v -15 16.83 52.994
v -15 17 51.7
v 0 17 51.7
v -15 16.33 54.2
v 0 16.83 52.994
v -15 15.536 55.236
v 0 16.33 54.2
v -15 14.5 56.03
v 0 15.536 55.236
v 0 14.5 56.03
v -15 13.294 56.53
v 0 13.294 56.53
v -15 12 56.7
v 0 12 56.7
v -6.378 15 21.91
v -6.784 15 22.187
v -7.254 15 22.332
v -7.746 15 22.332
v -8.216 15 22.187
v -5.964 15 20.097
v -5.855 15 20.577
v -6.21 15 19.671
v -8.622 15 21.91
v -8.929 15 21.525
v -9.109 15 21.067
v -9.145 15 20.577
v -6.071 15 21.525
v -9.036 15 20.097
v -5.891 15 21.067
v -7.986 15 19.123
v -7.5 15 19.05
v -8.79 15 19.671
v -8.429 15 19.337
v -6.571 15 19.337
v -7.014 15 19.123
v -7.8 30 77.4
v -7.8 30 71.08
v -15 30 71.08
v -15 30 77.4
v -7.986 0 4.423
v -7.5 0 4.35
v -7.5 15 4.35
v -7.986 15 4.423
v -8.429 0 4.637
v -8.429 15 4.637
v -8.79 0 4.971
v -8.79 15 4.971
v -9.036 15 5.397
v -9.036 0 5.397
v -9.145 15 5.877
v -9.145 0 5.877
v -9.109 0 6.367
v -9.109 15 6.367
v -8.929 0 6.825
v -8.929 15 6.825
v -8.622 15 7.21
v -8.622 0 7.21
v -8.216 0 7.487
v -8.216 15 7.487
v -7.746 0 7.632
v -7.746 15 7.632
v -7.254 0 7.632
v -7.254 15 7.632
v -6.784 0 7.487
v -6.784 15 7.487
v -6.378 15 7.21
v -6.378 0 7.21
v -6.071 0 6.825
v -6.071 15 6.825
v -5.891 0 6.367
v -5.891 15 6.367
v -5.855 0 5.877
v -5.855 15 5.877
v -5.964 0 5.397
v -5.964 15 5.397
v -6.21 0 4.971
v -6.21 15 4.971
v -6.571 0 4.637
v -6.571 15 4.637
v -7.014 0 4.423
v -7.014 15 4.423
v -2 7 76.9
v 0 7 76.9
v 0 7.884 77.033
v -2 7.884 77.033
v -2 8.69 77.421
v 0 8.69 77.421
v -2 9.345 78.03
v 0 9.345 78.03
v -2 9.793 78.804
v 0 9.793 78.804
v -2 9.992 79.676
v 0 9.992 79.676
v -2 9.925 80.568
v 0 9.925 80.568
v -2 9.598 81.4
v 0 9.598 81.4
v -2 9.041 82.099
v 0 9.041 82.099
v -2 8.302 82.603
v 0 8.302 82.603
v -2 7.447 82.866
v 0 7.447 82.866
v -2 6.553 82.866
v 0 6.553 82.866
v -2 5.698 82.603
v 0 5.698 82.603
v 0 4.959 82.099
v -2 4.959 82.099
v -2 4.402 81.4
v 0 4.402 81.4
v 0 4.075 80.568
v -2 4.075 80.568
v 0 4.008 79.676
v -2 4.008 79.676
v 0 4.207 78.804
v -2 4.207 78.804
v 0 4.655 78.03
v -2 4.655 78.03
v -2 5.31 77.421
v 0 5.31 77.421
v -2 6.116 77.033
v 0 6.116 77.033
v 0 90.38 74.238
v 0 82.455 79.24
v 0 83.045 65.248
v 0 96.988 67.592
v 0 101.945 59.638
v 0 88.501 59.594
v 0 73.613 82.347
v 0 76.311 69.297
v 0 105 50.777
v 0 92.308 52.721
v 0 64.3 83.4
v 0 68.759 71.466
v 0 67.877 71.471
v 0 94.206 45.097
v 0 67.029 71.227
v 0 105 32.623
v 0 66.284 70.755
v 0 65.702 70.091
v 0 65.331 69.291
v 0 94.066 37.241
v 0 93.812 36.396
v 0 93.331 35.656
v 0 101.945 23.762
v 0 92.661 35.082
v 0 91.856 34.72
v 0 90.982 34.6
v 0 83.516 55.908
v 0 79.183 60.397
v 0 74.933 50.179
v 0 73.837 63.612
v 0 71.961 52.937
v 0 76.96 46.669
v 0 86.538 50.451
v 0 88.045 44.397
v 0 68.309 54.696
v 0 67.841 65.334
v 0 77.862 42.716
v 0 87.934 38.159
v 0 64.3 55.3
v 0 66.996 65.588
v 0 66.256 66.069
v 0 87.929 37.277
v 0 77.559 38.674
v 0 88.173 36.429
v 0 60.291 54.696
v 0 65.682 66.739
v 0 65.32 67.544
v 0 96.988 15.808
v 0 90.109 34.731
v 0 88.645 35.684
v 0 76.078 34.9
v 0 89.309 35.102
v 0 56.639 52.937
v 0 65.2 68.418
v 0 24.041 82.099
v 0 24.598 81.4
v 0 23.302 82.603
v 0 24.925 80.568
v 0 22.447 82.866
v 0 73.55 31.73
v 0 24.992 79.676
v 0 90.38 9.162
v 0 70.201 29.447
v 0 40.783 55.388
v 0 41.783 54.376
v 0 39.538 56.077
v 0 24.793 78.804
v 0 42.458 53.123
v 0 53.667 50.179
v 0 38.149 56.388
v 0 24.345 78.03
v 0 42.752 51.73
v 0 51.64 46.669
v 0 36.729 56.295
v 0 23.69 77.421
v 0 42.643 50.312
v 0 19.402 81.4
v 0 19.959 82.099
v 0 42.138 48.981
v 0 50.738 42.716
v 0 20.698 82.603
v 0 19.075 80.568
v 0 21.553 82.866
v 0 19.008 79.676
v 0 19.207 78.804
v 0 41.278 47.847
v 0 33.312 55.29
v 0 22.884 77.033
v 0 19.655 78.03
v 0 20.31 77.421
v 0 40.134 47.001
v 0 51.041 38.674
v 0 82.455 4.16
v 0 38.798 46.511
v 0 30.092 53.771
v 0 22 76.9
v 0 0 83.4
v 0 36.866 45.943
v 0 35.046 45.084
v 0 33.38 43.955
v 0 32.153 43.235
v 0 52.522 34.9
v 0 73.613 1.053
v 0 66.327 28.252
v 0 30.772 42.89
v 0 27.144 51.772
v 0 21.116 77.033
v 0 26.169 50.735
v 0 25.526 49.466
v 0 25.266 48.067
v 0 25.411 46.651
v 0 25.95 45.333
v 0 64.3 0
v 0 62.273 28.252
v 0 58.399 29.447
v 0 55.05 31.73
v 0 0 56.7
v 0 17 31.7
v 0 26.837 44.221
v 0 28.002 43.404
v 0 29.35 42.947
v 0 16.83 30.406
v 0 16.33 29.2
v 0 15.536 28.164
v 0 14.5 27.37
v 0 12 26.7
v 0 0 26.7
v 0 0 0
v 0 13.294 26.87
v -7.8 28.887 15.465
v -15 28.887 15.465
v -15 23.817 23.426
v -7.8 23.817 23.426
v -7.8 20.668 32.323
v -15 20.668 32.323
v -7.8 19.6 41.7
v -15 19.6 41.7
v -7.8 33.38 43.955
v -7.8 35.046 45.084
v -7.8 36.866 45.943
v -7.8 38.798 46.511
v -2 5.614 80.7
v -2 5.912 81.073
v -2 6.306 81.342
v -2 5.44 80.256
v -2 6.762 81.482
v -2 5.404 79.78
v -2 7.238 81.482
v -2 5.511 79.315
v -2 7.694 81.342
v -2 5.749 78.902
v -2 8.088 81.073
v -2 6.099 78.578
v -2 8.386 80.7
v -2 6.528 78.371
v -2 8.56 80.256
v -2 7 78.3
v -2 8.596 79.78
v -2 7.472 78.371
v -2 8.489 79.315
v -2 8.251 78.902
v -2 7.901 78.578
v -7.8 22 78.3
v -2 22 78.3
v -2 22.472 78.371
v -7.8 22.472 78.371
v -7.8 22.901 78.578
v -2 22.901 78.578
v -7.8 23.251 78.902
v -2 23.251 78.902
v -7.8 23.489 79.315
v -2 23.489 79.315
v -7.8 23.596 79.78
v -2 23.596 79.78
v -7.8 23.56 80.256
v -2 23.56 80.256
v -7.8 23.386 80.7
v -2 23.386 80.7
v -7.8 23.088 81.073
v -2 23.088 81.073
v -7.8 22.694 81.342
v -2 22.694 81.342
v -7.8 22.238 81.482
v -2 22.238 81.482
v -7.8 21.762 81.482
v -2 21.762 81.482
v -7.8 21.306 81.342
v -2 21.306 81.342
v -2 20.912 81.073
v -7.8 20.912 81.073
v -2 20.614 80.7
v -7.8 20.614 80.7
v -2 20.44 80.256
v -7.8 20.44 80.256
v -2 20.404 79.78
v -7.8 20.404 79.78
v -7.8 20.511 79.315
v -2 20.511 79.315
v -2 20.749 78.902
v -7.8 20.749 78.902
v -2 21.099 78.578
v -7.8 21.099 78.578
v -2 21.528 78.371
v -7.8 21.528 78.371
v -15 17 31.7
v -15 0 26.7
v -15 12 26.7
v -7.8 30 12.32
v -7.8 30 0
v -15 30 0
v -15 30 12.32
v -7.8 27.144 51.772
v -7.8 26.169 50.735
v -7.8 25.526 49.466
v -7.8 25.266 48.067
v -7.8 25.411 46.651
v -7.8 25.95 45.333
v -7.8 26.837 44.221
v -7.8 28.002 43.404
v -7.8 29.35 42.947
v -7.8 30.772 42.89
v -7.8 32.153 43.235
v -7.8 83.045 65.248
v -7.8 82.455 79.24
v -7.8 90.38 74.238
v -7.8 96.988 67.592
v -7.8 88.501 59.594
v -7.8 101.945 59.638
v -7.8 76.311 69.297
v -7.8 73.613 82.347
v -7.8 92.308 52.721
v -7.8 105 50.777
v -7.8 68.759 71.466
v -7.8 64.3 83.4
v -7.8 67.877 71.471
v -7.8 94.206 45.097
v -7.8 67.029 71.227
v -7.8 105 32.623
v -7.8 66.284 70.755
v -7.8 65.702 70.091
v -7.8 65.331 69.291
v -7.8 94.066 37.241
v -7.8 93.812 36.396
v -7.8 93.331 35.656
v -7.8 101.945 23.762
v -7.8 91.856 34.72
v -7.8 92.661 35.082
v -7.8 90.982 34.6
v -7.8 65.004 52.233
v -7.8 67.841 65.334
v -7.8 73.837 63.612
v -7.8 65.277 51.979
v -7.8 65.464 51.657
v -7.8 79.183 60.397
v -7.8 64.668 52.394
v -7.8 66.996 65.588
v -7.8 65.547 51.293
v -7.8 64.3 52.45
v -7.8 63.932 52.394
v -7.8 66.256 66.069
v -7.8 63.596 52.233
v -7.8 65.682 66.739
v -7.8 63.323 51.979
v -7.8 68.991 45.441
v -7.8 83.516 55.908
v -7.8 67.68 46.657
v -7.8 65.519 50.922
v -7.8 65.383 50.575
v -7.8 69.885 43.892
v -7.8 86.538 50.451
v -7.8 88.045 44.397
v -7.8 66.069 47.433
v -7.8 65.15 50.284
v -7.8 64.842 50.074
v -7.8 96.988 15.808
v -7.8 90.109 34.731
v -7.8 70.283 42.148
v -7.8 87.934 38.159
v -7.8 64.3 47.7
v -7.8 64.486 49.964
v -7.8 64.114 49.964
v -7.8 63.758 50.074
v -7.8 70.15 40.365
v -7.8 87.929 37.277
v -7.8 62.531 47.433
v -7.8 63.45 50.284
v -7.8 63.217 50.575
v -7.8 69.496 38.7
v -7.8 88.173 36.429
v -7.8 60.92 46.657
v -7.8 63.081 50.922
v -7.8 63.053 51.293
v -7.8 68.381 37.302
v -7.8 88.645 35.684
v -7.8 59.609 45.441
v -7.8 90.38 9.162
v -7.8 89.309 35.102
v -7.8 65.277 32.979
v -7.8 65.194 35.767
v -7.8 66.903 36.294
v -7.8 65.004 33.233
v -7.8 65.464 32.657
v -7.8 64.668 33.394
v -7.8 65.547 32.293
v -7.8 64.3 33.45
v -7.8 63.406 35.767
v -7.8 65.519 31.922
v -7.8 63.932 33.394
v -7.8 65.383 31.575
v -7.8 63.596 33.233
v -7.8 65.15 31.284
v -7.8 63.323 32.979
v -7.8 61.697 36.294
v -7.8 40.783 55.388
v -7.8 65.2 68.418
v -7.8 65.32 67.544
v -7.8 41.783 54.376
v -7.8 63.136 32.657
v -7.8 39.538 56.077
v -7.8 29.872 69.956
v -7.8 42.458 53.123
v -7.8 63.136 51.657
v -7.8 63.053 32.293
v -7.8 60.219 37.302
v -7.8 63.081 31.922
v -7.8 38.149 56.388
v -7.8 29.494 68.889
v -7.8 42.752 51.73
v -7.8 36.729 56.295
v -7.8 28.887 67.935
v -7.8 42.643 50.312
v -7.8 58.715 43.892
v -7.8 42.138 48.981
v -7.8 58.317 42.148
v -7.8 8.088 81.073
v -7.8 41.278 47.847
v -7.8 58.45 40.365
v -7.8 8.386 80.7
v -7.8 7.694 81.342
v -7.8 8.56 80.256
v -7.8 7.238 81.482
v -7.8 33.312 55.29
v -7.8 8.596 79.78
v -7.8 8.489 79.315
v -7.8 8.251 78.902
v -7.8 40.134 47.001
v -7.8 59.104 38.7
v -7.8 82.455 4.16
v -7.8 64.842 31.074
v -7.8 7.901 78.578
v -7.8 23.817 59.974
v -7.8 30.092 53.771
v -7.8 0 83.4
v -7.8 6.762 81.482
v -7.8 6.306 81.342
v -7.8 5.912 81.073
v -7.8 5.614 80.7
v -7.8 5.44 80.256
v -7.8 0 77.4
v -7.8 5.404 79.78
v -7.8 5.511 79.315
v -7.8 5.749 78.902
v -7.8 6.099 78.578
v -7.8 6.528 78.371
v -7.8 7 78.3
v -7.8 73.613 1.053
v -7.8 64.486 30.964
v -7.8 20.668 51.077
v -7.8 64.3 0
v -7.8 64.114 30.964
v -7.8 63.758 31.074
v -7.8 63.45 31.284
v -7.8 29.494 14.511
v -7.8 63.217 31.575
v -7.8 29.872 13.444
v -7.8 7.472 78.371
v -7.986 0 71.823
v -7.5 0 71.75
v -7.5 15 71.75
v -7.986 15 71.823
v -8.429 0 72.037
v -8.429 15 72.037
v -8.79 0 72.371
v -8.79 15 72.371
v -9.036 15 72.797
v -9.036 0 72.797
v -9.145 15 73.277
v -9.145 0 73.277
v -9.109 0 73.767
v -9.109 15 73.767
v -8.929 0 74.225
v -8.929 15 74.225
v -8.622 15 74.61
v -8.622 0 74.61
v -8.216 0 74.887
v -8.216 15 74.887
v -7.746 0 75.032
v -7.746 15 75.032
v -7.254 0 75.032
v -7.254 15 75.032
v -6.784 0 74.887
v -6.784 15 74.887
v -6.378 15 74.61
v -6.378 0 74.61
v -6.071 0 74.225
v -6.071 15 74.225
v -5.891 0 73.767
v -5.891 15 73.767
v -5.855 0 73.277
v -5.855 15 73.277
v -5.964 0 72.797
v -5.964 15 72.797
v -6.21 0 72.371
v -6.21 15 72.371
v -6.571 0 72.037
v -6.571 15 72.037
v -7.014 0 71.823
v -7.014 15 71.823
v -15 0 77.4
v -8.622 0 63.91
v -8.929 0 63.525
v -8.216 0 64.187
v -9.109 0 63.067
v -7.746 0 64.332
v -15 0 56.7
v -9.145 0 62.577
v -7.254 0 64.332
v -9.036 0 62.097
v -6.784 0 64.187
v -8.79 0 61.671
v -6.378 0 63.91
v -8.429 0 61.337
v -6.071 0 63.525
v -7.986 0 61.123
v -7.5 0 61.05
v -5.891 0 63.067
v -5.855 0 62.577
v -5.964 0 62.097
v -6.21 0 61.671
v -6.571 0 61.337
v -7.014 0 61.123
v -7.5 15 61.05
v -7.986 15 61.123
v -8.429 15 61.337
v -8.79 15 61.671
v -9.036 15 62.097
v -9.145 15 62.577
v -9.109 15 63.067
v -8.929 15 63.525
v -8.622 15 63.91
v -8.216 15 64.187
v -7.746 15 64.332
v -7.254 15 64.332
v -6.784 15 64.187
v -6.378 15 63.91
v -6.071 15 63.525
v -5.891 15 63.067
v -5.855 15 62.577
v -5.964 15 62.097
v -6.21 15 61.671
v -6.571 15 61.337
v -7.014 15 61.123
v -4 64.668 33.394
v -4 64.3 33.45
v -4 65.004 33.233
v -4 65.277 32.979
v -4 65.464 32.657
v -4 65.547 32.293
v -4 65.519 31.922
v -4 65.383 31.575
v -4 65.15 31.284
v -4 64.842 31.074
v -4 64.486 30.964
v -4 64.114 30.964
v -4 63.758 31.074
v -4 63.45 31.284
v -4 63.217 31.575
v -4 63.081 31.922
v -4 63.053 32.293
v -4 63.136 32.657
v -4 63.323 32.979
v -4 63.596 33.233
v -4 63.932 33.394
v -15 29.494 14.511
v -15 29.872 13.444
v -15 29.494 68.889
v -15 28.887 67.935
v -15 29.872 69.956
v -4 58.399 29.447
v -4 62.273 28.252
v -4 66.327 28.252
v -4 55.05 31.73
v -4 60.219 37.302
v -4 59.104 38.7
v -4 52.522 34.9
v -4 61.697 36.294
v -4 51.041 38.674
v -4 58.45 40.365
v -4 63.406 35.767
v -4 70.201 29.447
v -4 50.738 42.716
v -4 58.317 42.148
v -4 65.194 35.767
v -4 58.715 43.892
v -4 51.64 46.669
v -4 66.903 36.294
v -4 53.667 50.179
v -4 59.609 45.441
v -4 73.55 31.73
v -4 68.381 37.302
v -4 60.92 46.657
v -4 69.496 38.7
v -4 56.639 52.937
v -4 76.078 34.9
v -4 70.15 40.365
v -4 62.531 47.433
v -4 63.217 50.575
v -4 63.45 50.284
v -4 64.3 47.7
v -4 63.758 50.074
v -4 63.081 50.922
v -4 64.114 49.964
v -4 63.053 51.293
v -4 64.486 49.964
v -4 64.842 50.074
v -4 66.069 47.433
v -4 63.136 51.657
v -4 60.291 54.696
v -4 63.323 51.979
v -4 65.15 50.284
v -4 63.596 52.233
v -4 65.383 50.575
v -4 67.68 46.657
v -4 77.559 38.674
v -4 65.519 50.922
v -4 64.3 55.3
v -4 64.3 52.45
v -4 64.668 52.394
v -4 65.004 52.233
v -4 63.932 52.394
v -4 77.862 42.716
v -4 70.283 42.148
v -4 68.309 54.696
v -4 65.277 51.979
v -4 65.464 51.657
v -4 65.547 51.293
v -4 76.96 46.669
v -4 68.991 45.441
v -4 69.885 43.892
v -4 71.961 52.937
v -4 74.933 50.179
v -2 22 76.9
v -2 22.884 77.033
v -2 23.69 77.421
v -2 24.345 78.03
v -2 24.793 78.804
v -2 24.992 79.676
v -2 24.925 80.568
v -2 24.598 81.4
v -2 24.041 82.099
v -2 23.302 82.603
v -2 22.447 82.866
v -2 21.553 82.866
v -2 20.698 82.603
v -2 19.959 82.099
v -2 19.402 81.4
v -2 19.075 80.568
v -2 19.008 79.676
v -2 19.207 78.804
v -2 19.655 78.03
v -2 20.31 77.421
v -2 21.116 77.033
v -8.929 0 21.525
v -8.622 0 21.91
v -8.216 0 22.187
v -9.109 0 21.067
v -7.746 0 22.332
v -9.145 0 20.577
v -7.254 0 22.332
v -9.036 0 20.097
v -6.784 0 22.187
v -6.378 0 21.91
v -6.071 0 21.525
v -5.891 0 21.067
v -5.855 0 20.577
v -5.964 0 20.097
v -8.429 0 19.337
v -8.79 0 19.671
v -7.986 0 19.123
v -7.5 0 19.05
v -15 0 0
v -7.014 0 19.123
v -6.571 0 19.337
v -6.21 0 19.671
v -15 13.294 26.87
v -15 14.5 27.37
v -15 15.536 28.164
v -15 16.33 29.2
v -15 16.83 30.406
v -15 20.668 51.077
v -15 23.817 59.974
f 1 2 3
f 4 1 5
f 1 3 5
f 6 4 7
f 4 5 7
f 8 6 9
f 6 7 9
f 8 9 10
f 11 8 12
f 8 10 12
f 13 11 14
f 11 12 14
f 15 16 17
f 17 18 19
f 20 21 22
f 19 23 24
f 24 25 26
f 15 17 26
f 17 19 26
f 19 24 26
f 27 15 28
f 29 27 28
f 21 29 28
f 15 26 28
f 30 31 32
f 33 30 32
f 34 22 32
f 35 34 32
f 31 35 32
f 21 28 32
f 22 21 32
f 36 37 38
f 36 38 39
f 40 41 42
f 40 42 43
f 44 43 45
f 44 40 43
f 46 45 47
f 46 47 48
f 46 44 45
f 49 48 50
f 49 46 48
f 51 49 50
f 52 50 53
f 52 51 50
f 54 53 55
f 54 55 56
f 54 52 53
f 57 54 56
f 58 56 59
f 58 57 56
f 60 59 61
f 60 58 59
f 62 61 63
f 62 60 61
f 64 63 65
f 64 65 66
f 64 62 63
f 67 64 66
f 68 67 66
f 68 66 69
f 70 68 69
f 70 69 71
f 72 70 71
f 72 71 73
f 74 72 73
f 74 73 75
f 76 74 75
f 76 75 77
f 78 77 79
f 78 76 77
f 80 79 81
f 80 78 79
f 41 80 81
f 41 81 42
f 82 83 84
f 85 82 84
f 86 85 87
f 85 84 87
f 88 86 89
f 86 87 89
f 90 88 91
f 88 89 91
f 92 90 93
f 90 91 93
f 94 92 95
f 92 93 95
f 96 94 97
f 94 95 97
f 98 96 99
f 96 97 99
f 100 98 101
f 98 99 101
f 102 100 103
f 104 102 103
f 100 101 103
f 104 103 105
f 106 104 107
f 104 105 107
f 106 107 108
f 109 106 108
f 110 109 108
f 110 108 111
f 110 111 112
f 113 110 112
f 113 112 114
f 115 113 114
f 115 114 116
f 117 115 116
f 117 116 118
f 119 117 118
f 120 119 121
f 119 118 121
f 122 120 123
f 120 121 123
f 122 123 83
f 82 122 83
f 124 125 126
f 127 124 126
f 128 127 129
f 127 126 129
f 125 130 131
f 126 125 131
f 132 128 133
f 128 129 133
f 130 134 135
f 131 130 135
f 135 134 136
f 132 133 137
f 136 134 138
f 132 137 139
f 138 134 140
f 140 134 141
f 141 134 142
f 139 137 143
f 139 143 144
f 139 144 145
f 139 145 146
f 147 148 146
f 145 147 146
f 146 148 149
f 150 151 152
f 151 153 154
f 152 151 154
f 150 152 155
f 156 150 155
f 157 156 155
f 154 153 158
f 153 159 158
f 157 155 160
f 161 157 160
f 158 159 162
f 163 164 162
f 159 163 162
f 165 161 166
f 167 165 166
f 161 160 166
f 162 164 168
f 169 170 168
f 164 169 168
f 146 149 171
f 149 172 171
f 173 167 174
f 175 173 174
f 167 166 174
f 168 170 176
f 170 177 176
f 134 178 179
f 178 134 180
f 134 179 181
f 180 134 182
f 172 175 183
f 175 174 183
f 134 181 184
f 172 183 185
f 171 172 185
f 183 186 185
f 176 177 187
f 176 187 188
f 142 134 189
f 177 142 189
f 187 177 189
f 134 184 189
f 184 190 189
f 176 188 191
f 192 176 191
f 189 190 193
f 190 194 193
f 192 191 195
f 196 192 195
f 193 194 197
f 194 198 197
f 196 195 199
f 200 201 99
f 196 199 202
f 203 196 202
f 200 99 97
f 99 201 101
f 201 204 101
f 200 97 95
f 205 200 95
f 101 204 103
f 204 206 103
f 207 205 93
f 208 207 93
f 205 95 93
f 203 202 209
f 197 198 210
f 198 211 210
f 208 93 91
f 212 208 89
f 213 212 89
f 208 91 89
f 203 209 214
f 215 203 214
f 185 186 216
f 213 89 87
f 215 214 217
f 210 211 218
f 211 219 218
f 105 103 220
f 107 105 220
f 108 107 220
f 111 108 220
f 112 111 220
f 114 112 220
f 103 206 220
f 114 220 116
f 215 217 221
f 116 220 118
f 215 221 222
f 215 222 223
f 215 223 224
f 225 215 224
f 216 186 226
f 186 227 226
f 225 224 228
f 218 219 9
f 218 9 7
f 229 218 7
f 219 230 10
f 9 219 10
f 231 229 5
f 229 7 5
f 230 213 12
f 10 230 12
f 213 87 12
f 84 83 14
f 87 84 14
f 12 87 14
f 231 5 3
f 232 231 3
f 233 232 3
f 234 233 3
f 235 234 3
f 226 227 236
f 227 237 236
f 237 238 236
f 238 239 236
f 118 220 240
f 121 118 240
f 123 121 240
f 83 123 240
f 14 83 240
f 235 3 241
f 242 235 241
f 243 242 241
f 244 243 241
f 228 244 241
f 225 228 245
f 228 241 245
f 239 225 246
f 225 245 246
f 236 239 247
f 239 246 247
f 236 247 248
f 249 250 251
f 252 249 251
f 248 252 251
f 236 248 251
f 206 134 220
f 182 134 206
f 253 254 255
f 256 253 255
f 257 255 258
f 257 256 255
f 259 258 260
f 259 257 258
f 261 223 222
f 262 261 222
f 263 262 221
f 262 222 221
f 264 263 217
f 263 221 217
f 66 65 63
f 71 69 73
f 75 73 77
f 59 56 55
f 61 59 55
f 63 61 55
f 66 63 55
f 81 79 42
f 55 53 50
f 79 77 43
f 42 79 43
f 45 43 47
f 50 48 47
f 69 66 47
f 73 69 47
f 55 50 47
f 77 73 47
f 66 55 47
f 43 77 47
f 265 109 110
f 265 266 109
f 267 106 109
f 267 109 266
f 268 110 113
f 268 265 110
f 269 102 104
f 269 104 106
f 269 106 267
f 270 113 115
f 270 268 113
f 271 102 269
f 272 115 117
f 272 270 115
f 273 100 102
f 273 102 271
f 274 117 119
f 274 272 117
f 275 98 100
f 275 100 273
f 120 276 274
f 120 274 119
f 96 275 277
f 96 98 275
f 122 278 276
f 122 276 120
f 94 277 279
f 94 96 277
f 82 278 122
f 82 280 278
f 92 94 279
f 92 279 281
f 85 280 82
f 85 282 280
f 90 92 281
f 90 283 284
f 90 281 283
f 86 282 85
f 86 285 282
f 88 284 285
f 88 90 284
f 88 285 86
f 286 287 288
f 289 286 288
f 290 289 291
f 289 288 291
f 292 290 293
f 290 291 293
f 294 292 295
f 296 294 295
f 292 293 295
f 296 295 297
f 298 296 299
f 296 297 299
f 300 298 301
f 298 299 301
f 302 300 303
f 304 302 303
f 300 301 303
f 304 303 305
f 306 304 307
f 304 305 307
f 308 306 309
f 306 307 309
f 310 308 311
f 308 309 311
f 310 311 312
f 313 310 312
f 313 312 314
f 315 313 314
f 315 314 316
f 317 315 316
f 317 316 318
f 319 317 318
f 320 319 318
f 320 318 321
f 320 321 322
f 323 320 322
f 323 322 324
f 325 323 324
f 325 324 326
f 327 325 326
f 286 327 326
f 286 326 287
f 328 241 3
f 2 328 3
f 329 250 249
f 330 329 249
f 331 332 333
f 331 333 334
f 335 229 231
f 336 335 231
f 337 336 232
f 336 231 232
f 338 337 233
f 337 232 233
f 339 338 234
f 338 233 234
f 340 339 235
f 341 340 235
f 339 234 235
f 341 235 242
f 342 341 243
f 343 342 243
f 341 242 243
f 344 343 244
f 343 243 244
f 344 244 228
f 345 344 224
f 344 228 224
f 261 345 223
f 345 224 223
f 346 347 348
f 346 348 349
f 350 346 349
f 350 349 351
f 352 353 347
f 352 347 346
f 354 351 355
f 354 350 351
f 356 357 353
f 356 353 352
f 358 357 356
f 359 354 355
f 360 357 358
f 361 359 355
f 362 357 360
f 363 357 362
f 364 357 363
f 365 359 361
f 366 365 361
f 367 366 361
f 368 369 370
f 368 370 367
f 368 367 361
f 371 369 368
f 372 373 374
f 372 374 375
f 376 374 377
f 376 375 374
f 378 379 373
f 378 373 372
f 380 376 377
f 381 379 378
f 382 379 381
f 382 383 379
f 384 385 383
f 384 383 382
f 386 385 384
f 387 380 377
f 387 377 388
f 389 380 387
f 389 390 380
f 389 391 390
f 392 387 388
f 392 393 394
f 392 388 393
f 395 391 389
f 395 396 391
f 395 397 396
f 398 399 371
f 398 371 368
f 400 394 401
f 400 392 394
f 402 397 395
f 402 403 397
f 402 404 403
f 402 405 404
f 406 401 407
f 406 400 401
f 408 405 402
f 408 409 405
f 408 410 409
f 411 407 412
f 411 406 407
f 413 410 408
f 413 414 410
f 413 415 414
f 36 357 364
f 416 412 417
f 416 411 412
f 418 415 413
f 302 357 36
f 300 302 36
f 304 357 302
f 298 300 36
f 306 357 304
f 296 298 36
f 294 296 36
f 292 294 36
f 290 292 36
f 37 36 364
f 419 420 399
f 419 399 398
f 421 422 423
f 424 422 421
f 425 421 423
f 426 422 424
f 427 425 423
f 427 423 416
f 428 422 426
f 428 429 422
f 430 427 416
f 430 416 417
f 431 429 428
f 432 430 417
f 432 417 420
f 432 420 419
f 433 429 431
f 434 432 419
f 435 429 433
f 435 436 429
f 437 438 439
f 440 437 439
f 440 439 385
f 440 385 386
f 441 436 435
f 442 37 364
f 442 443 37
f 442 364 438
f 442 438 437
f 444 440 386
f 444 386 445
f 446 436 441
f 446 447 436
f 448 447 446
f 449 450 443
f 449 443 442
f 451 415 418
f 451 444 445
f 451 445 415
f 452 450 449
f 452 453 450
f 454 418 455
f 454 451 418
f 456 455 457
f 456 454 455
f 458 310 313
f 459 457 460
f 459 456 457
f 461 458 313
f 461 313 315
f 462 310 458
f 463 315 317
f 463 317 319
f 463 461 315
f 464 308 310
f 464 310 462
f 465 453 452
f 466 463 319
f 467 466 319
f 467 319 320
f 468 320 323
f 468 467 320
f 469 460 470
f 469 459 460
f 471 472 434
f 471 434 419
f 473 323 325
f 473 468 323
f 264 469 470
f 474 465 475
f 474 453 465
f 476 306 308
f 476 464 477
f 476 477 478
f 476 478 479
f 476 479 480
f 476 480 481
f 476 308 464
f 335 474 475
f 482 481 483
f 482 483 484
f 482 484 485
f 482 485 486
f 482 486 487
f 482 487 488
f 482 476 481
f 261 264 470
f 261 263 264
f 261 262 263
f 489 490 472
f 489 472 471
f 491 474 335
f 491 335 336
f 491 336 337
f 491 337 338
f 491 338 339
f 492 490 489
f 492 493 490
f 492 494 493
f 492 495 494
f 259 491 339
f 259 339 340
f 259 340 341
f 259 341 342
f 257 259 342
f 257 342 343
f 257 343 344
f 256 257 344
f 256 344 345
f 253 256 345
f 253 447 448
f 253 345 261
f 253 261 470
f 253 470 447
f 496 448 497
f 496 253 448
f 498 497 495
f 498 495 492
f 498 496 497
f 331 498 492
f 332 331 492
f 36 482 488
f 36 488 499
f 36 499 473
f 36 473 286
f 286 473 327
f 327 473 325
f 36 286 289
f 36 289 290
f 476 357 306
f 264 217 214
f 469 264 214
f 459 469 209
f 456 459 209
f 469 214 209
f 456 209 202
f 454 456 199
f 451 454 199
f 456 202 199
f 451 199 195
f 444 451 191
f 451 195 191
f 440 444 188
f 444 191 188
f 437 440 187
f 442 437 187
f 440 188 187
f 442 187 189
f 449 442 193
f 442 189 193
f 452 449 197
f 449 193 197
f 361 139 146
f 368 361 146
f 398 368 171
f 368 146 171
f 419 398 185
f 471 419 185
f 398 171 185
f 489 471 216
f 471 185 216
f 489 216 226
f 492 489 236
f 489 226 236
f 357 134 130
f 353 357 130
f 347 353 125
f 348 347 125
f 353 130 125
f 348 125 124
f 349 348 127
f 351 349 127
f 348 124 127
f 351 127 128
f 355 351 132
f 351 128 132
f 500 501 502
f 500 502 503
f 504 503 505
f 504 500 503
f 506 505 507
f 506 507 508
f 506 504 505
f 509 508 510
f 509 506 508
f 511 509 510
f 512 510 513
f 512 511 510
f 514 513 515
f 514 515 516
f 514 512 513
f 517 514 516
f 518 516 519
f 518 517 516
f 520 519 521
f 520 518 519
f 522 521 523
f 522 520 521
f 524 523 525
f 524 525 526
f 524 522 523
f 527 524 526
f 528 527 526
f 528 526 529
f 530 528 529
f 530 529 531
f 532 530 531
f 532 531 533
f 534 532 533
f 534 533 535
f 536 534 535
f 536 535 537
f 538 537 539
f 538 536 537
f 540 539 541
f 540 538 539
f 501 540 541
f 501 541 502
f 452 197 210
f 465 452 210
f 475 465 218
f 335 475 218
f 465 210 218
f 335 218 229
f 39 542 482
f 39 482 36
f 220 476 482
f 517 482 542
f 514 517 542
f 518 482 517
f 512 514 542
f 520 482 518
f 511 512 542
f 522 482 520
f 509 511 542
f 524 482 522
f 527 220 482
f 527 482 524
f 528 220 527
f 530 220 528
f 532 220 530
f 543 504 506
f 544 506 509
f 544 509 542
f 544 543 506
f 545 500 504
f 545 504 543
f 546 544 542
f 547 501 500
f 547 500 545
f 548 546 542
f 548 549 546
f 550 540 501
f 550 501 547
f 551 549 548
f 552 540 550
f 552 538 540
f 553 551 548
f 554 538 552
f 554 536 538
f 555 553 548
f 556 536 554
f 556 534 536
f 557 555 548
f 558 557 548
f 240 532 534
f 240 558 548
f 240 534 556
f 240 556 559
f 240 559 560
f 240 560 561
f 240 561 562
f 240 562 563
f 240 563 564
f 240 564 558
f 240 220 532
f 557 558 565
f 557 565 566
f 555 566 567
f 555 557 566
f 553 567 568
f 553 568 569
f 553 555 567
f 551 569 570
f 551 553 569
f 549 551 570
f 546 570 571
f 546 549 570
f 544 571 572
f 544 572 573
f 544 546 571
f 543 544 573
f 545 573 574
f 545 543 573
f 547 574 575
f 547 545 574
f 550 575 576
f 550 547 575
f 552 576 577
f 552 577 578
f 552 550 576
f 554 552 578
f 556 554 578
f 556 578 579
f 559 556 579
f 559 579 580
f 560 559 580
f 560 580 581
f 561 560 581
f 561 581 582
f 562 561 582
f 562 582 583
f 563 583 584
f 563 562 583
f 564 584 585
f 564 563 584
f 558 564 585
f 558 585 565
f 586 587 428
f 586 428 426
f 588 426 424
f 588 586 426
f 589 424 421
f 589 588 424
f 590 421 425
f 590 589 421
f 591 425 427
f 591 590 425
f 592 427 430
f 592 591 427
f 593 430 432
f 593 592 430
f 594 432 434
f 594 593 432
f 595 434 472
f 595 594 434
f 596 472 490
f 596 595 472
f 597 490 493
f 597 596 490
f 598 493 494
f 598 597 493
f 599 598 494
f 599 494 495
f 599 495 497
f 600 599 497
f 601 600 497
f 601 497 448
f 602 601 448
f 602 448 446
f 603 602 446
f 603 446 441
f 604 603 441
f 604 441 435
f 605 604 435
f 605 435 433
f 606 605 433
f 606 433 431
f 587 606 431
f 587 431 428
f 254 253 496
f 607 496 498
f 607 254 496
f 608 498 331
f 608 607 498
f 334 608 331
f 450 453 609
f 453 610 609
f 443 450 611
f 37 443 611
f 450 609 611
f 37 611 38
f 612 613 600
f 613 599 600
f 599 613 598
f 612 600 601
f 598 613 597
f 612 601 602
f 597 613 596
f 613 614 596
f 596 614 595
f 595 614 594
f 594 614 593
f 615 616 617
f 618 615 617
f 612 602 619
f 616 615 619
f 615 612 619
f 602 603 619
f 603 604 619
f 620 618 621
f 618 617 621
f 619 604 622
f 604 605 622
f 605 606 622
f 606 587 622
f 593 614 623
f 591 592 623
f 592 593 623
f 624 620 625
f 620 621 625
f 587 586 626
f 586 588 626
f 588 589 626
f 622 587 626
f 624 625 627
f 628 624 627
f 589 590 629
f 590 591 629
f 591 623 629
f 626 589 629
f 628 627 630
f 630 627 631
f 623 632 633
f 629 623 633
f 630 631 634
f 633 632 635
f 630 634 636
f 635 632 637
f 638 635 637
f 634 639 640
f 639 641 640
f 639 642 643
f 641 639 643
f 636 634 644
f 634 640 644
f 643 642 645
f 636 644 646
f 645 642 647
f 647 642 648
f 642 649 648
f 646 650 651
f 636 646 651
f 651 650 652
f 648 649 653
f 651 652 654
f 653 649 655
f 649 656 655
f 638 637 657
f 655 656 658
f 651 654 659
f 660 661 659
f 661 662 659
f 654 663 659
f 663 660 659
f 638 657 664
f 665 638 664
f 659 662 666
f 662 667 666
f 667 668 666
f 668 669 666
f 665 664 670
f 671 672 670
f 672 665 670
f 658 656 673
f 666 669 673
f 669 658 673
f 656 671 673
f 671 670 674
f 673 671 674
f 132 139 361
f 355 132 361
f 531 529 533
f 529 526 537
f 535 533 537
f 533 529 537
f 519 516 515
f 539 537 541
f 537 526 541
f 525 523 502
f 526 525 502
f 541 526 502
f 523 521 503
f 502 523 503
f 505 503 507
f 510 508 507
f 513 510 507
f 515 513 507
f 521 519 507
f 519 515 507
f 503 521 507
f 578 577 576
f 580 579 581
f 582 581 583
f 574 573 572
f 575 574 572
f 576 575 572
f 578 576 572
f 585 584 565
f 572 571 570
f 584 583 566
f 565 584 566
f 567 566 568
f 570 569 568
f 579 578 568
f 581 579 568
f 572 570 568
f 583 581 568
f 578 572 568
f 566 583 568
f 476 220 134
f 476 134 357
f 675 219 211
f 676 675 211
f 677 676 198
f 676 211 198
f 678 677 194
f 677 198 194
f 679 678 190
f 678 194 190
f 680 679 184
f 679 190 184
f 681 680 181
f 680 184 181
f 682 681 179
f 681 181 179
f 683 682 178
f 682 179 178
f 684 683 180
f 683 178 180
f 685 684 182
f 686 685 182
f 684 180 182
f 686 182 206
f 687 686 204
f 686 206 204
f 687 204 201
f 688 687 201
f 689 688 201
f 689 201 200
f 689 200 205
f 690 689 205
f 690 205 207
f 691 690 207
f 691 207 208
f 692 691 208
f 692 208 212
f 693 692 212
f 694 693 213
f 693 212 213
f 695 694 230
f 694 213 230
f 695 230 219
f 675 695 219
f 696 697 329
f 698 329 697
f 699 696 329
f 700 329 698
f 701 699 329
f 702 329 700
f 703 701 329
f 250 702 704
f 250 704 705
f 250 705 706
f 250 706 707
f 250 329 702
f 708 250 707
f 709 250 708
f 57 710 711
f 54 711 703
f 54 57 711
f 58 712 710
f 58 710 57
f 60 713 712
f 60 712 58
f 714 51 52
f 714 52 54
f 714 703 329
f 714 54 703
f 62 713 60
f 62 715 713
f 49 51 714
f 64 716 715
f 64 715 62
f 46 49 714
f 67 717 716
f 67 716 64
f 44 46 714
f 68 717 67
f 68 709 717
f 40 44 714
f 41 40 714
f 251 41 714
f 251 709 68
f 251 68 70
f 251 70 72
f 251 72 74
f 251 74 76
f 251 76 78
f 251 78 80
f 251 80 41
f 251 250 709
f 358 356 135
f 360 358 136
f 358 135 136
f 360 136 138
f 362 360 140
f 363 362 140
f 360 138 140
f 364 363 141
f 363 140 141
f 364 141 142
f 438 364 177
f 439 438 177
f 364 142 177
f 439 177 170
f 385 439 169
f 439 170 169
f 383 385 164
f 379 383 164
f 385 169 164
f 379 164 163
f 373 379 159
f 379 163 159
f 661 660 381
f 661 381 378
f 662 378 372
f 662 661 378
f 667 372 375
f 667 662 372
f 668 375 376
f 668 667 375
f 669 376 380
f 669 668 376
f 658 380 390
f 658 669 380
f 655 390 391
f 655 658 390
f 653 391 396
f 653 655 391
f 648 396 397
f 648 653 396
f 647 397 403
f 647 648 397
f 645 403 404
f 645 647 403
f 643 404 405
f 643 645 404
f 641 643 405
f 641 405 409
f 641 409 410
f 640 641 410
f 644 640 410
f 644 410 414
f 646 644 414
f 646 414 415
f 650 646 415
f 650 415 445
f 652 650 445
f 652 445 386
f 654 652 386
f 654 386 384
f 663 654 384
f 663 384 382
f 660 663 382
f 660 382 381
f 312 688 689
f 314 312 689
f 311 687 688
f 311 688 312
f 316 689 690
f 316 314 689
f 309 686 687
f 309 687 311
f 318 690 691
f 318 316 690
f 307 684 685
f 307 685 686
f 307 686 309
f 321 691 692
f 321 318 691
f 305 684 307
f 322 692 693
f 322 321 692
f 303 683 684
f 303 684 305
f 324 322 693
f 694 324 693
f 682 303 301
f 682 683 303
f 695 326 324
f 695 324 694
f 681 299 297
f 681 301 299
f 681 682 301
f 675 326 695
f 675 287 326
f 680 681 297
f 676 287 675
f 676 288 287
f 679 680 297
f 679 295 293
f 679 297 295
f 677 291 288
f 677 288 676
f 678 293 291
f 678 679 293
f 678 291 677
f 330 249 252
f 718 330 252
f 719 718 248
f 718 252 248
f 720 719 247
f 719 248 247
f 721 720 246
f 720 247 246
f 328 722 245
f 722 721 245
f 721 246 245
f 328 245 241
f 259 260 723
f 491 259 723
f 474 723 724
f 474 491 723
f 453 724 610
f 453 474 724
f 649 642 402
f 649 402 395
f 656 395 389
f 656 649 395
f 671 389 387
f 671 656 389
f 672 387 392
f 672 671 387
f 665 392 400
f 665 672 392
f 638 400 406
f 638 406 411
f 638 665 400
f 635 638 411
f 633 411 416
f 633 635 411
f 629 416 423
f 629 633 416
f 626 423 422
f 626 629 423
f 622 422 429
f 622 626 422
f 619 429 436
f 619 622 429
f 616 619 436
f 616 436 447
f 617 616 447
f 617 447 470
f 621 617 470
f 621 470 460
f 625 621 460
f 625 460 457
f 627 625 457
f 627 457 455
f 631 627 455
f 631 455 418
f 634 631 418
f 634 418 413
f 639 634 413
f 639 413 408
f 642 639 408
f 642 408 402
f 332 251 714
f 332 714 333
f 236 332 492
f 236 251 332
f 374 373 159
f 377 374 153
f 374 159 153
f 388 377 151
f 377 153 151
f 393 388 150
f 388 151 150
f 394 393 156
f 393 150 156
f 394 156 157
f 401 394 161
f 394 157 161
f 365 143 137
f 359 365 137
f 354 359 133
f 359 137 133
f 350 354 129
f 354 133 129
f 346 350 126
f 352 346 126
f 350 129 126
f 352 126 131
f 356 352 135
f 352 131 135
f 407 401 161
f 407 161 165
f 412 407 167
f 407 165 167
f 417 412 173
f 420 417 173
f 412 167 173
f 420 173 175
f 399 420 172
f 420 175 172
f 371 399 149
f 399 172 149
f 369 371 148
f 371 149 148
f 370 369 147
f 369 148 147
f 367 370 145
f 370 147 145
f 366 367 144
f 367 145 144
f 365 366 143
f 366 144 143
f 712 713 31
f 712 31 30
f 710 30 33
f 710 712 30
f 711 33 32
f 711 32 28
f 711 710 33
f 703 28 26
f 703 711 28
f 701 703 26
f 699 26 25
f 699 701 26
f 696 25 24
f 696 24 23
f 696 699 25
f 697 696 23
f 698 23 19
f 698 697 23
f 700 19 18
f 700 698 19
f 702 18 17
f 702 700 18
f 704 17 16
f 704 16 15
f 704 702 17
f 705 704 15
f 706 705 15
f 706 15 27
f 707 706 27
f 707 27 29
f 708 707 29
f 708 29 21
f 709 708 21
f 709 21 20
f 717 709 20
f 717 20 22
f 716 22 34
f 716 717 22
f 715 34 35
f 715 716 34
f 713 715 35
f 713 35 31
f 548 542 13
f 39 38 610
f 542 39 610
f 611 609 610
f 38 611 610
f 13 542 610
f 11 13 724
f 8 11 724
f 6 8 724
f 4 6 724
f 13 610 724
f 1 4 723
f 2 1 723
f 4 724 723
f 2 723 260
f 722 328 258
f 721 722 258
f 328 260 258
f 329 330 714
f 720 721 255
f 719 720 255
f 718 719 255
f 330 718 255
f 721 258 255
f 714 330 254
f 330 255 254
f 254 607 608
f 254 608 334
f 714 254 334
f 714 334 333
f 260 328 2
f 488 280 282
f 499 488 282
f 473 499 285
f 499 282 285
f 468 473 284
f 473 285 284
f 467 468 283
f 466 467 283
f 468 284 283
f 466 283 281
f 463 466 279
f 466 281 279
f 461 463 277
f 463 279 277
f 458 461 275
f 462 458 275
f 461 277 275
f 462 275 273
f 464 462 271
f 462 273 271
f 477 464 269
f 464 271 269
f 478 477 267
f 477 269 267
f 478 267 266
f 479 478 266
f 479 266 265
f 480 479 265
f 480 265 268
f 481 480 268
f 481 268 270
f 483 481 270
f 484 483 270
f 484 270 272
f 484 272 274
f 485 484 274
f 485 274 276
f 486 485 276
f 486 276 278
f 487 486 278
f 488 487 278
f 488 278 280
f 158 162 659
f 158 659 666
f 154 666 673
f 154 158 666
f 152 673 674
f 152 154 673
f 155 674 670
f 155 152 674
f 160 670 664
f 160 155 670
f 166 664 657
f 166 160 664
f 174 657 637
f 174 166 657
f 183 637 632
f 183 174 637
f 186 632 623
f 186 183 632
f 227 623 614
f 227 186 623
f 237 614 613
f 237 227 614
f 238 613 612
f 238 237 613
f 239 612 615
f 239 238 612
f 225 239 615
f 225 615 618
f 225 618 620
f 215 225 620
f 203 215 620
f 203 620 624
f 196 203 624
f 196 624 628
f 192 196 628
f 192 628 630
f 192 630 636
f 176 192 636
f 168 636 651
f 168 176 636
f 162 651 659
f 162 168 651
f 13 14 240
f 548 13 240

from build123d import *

# Parameters (mm, degrees)
SKETCH_1_W           = 7.8
SKETCH_1_H           = 83.4
EXTRUDE_1_DEPTH      = 105
CUT_EXTRUDE_1_DEPTH  = 135.318278726
SKETCH_3_R           = 6
CUT_EXTRUDE_2_DEPTH  = 135.318278726
SKETCH_4_R           = 13.6
CUT_EXTRUDE_3_DEPTH  = 4
SKETCH_5_R           = 1.25
CUT_EXTRUDE_4_DEPTH  = 4
EXTRUDE_2_DEPTH      = 7.2
SKETCH_7_W           = 6
SKETCH_7_H           = 30
CUT_EXTRUDE_5_DEPTH  = 7.2
CUT_EXTRUDE_6_DEPTH  = 135.92798079
SKETCH_9_R           = 1.65
CUT_EXTRUDE_7_DEPTH  = 15
FILLET_1_R           = 5
CUT_EXTRUDE_8_DEPTH  = 135.92798079
CUT_EXTRUDE_10_DEPTH = 135.92798079
SKETCH_14_R          = 1.6
CUT_EXTRUDE_11_DEPTH = 135.92798079
SKETCH_15_R          = 3
CUT_EXTRUDE_12_DEPTH = 2


with BuildPart() as part:
    # 草图1 → 凸台-拉伸1 (new body)
    with BuildSketch(Plane(origin=(0, 0, 0), x_dir=(1, 0, 0), z_dir=(0, 1, 0))):
        with Locations((3.9, -41.7)):
            Rectangle(SKETCH_1_W, SKETCH_1_H)
    extrude(amount=EXTRUDE_1_DEPTH)

    # 草图2 → 切除-拉伸1 (cut, through all)
    with BuildSketch(Plane.ZY):
        with BuildLine():
            Line((0, 64.3), (0, 105))
            Line((0, 105), (32.622555426, 105))
            ThreePointArc((32.622555426, 105), (9.162180169, 90.380266115), (0, 64.3))
        make_face()
        with BuildLine():
            Line((83.4, 105), (83.4, 64.3))
            ThreePointArc((83.4, 64.3), (74.237819831, 90.380266115), (50.777444574, 105))
            Line((50.777444574, 105), (83.4, 105))
        make_face()
    extrude(amount=-CUT_EXTRUDE_1_DEPTH, mode=Mode.SUBTRACT)

    # 草图3 → 切除-拉伸2 (cut, through all)
    with BuildSketch(Plane.ZY):
        with Locations((41.7, 64.3)):
            Circle(SKETCH_3_R)
    extrude(amount=-CUT_EXTRUDE_2_DEPTH, mode=Mode.SUBTRACT)

    # 草图4 → 切除-拉伸3 (cut)
    with BuildSketch(Plane.ZY):
        with Locations((41.7, 64.3)):
            Circle(SKETCH_4_R)
    extrude(amount=-CUT_EXTRUDE_3_DEPTH, mode=Mode.SUBTRACT)

    # 草图5 → 切除-拉伸4 (cut)
    with BuildSketch(Plane.ZY.offset(-4)):
        with Locations((32.2, 64.3)):
            Circle(SKETCH_5_R)
        with Locations((51.2, 64.3)):
            Circle(SKETCH_5_R)
    extrude(amount=-CUT_EXTRUDE_4_DEPTH, mode=Mode.SUBTRACT)

    # 草图6 → 凸台-拉伸2 (add)
    with BuildSketch(Plane(origin=(7.8, 0, 0), x_dir=(0, 0, -1), z_dir=(1, 0, 0))):
        with BuildLine():
            ThreePointArc((-14.146415841, 30), (-26.974511893, 22.286540784), (-41.7, 19.6))
            Line((-41.7, 19.6), (-41.7, 0))
            Line((-41.7, 0), (0, 0))
            Line((0, 0), (0, 30))
            Line((0, 30), (-14.146415841, 30))
        make_face()
        with BuildLine():
            Line((-41.7, 0), (-41.7, 19.6))
            ThreePointArc((-41.7, 19.6), (-56.425488107, 22.286540784), (-69.253584159, 30))
            Line((-69.253584159, 30), (-83.4, 30))
            Line((-83.4, 30), (-83.4, 0))
            Line((-83.4, 0), (-41.7, 0))
        make_face()
    extrude(amount=EXTRUDE_2_DEPTH)

    # 草图7 → 切除-拉伸5 (cut)
    with BuildSketch(Plane(origin=(15, 0, 0), x_dir=(0, 0, -1), z_dir=(1, 0, 0))):
        with Locations((-80.4, 15)):
            Rectangle(SKETCH_7_W, SKETCH_7_H)
    extrude(amount=-CUT_EXTRUDE_5_DEPTH, mode=Mode.SUBTRACT)

    # 草图8 → 切除-拉伸6 (cut, through all)
    with BuildSketch(Plane.ZY):
        with BuildLine():
            Line((31.7, 17), (51.7, 17))
            ThreePointArc((51.7, 17), (55.235533906, 15.535533906), (56.7, 12))
            Line((56.7, 12), (56.7, 0))
            Line((56.7, 0), (26.7, 0))
            Line((26.7, 0), (26.7, 12))
            ThreePointArc((26.7, 12), (28.164466094, 15.535533906), (31.7, 17))
        make_face()
    extrude(amount=-CUT_EXTRUDE_6_DEPTH, mode=Mode.SUBTRACT)

    # 草图9 → 切除-拉伸7 (cut)
    with BuildSketch(Plane.XZ):
        with Locations(Location((7.5, 73.4, 0), (0, 0, 270))):
            Circle(SKETCH_9_R)
        with Locations(Location((7.5, 62.7, 0), (0, 0, 270))):
            Circle(SKETCH_9_R)
        with Locations(Location((7.5, 20.7, 0), (0, 0, 270))):
            Circle(SKETCH_9_R)
        with Locations(Location((7.5, 6, 0), (0, 0, 270))):
            Circle(SKETCH_9_R)
    extrude(amount=-CUT_EXTRUDE_7_DEPTH, mode=Mode.SUBTRACT)


with BuildPart() as body_2:
    # 镜向2: mirrored copy
    add(part.part.mirror(Plane(origin=(0, 0, 0), x_dir=(0, 0, 1), z_dir=(1, 0, 0))))

    # 圆角1
    fillet_1_edges = [body_2.edges().sort_by_distance(p)[0] for p in [
        (-11.4, 30, 14.146415841),
        (-11.4, 30, 69.253584159),
    ]]
    fillet(fillet_1_edges, radius=FILLET_1_R)

    # 草图10 → 切除-拉伸8 (cut, through all)
    with BuildSketch(Plane(origin=(0, 0, 0), x_dir=(0, 0, -1), z_dir=(1, 0, 0))):
        with BuildLine():
            ThreePointArc((-37.240706086, 94.065786869), (-59.594392776, 88.500786708), (-71.465786869, 68.759293914))
            ThreePointArc((-71.465786869, 68.759293914), (-68.859293916, 65.234213137), (-65.334213139, 67.840706089))
            ThreePointArc((-65.334213139, 67.840706089), (-55.908255092, 83.515569664), (-38.159293911, 87.934213139))
            ThreePointArc((-38.159293911, 87.934213139), (-34.634213133, 90.540706091), (-37.240706086, 94.065786869))
        make_face()
    extrude(amount=-CUT_EXTRUDE_8_DEPTH, mode=Mode.SUBTRACT)

    # 草图13 → 切除-拉伸10 (cut, through all)
    with BuildSketch(Plane(origin=(0, 0, 0), x_dir=(0, 0, -1), z_dir=(1, 0, 0))):
        with BuildLine():
            ThreePointArc((-56.294598294, 36.728714307), (-54.592965975, 31.672402134), (-51.772187936, 27.144151191))
            ThreePointArc((-51.772187936, 27.144151191), (-44.745463477, 26.353491098), (-43.954803385, 33.380215557))
            ThreePointArc((-43.954803385, 33.380215557), (-45.549156189, 35.939661742), (-46.51094837, 38.797577319))
            ThreePointArc((-46.51094837, 38.797577319), (-52.437204837, 42.654970775), (-56.294598294, 36.728714307))
        make_face()
    extrude(amount=-CUT_EXTRUDE_10_DEPTH, mode=Mode.SUBTRACT)

    # 草图14 → 切除-拉伸11 (cut, through all)
    with BuildSketch(Plane(origin=(0, 0, 0), x_dir=(0, 0, -1), z_dir=(1, 0, 0))):
        with Locations((-79.9, 7)):
            Circle(SKETCH_14_R)
        with Locations((-79.9, 22)):
            Circle(SKETCH_14_R)
    extrude(amount=-CUT_EXTRUDE_11_DEPTH, mode=Mode.SUBTRACT)

    # 草图15 → 切除-拉伸12 (cut)
    with BuildSketch(Plane(origin=(0, 0, 0), x_dir=(0, 0, -1), z_dir=(1, 0, 0))):
        with Locations((-79.9, 22)):
            Circle(SKETCH_15_R)
        with Locations((-79.9, 7)):
            Circle(SKETCH_15_R)
    extrude(amount=-CUT_EXTRUDE_12_DEPTH, mode=Mode.SUBTRACT)


solid = body_2.part
